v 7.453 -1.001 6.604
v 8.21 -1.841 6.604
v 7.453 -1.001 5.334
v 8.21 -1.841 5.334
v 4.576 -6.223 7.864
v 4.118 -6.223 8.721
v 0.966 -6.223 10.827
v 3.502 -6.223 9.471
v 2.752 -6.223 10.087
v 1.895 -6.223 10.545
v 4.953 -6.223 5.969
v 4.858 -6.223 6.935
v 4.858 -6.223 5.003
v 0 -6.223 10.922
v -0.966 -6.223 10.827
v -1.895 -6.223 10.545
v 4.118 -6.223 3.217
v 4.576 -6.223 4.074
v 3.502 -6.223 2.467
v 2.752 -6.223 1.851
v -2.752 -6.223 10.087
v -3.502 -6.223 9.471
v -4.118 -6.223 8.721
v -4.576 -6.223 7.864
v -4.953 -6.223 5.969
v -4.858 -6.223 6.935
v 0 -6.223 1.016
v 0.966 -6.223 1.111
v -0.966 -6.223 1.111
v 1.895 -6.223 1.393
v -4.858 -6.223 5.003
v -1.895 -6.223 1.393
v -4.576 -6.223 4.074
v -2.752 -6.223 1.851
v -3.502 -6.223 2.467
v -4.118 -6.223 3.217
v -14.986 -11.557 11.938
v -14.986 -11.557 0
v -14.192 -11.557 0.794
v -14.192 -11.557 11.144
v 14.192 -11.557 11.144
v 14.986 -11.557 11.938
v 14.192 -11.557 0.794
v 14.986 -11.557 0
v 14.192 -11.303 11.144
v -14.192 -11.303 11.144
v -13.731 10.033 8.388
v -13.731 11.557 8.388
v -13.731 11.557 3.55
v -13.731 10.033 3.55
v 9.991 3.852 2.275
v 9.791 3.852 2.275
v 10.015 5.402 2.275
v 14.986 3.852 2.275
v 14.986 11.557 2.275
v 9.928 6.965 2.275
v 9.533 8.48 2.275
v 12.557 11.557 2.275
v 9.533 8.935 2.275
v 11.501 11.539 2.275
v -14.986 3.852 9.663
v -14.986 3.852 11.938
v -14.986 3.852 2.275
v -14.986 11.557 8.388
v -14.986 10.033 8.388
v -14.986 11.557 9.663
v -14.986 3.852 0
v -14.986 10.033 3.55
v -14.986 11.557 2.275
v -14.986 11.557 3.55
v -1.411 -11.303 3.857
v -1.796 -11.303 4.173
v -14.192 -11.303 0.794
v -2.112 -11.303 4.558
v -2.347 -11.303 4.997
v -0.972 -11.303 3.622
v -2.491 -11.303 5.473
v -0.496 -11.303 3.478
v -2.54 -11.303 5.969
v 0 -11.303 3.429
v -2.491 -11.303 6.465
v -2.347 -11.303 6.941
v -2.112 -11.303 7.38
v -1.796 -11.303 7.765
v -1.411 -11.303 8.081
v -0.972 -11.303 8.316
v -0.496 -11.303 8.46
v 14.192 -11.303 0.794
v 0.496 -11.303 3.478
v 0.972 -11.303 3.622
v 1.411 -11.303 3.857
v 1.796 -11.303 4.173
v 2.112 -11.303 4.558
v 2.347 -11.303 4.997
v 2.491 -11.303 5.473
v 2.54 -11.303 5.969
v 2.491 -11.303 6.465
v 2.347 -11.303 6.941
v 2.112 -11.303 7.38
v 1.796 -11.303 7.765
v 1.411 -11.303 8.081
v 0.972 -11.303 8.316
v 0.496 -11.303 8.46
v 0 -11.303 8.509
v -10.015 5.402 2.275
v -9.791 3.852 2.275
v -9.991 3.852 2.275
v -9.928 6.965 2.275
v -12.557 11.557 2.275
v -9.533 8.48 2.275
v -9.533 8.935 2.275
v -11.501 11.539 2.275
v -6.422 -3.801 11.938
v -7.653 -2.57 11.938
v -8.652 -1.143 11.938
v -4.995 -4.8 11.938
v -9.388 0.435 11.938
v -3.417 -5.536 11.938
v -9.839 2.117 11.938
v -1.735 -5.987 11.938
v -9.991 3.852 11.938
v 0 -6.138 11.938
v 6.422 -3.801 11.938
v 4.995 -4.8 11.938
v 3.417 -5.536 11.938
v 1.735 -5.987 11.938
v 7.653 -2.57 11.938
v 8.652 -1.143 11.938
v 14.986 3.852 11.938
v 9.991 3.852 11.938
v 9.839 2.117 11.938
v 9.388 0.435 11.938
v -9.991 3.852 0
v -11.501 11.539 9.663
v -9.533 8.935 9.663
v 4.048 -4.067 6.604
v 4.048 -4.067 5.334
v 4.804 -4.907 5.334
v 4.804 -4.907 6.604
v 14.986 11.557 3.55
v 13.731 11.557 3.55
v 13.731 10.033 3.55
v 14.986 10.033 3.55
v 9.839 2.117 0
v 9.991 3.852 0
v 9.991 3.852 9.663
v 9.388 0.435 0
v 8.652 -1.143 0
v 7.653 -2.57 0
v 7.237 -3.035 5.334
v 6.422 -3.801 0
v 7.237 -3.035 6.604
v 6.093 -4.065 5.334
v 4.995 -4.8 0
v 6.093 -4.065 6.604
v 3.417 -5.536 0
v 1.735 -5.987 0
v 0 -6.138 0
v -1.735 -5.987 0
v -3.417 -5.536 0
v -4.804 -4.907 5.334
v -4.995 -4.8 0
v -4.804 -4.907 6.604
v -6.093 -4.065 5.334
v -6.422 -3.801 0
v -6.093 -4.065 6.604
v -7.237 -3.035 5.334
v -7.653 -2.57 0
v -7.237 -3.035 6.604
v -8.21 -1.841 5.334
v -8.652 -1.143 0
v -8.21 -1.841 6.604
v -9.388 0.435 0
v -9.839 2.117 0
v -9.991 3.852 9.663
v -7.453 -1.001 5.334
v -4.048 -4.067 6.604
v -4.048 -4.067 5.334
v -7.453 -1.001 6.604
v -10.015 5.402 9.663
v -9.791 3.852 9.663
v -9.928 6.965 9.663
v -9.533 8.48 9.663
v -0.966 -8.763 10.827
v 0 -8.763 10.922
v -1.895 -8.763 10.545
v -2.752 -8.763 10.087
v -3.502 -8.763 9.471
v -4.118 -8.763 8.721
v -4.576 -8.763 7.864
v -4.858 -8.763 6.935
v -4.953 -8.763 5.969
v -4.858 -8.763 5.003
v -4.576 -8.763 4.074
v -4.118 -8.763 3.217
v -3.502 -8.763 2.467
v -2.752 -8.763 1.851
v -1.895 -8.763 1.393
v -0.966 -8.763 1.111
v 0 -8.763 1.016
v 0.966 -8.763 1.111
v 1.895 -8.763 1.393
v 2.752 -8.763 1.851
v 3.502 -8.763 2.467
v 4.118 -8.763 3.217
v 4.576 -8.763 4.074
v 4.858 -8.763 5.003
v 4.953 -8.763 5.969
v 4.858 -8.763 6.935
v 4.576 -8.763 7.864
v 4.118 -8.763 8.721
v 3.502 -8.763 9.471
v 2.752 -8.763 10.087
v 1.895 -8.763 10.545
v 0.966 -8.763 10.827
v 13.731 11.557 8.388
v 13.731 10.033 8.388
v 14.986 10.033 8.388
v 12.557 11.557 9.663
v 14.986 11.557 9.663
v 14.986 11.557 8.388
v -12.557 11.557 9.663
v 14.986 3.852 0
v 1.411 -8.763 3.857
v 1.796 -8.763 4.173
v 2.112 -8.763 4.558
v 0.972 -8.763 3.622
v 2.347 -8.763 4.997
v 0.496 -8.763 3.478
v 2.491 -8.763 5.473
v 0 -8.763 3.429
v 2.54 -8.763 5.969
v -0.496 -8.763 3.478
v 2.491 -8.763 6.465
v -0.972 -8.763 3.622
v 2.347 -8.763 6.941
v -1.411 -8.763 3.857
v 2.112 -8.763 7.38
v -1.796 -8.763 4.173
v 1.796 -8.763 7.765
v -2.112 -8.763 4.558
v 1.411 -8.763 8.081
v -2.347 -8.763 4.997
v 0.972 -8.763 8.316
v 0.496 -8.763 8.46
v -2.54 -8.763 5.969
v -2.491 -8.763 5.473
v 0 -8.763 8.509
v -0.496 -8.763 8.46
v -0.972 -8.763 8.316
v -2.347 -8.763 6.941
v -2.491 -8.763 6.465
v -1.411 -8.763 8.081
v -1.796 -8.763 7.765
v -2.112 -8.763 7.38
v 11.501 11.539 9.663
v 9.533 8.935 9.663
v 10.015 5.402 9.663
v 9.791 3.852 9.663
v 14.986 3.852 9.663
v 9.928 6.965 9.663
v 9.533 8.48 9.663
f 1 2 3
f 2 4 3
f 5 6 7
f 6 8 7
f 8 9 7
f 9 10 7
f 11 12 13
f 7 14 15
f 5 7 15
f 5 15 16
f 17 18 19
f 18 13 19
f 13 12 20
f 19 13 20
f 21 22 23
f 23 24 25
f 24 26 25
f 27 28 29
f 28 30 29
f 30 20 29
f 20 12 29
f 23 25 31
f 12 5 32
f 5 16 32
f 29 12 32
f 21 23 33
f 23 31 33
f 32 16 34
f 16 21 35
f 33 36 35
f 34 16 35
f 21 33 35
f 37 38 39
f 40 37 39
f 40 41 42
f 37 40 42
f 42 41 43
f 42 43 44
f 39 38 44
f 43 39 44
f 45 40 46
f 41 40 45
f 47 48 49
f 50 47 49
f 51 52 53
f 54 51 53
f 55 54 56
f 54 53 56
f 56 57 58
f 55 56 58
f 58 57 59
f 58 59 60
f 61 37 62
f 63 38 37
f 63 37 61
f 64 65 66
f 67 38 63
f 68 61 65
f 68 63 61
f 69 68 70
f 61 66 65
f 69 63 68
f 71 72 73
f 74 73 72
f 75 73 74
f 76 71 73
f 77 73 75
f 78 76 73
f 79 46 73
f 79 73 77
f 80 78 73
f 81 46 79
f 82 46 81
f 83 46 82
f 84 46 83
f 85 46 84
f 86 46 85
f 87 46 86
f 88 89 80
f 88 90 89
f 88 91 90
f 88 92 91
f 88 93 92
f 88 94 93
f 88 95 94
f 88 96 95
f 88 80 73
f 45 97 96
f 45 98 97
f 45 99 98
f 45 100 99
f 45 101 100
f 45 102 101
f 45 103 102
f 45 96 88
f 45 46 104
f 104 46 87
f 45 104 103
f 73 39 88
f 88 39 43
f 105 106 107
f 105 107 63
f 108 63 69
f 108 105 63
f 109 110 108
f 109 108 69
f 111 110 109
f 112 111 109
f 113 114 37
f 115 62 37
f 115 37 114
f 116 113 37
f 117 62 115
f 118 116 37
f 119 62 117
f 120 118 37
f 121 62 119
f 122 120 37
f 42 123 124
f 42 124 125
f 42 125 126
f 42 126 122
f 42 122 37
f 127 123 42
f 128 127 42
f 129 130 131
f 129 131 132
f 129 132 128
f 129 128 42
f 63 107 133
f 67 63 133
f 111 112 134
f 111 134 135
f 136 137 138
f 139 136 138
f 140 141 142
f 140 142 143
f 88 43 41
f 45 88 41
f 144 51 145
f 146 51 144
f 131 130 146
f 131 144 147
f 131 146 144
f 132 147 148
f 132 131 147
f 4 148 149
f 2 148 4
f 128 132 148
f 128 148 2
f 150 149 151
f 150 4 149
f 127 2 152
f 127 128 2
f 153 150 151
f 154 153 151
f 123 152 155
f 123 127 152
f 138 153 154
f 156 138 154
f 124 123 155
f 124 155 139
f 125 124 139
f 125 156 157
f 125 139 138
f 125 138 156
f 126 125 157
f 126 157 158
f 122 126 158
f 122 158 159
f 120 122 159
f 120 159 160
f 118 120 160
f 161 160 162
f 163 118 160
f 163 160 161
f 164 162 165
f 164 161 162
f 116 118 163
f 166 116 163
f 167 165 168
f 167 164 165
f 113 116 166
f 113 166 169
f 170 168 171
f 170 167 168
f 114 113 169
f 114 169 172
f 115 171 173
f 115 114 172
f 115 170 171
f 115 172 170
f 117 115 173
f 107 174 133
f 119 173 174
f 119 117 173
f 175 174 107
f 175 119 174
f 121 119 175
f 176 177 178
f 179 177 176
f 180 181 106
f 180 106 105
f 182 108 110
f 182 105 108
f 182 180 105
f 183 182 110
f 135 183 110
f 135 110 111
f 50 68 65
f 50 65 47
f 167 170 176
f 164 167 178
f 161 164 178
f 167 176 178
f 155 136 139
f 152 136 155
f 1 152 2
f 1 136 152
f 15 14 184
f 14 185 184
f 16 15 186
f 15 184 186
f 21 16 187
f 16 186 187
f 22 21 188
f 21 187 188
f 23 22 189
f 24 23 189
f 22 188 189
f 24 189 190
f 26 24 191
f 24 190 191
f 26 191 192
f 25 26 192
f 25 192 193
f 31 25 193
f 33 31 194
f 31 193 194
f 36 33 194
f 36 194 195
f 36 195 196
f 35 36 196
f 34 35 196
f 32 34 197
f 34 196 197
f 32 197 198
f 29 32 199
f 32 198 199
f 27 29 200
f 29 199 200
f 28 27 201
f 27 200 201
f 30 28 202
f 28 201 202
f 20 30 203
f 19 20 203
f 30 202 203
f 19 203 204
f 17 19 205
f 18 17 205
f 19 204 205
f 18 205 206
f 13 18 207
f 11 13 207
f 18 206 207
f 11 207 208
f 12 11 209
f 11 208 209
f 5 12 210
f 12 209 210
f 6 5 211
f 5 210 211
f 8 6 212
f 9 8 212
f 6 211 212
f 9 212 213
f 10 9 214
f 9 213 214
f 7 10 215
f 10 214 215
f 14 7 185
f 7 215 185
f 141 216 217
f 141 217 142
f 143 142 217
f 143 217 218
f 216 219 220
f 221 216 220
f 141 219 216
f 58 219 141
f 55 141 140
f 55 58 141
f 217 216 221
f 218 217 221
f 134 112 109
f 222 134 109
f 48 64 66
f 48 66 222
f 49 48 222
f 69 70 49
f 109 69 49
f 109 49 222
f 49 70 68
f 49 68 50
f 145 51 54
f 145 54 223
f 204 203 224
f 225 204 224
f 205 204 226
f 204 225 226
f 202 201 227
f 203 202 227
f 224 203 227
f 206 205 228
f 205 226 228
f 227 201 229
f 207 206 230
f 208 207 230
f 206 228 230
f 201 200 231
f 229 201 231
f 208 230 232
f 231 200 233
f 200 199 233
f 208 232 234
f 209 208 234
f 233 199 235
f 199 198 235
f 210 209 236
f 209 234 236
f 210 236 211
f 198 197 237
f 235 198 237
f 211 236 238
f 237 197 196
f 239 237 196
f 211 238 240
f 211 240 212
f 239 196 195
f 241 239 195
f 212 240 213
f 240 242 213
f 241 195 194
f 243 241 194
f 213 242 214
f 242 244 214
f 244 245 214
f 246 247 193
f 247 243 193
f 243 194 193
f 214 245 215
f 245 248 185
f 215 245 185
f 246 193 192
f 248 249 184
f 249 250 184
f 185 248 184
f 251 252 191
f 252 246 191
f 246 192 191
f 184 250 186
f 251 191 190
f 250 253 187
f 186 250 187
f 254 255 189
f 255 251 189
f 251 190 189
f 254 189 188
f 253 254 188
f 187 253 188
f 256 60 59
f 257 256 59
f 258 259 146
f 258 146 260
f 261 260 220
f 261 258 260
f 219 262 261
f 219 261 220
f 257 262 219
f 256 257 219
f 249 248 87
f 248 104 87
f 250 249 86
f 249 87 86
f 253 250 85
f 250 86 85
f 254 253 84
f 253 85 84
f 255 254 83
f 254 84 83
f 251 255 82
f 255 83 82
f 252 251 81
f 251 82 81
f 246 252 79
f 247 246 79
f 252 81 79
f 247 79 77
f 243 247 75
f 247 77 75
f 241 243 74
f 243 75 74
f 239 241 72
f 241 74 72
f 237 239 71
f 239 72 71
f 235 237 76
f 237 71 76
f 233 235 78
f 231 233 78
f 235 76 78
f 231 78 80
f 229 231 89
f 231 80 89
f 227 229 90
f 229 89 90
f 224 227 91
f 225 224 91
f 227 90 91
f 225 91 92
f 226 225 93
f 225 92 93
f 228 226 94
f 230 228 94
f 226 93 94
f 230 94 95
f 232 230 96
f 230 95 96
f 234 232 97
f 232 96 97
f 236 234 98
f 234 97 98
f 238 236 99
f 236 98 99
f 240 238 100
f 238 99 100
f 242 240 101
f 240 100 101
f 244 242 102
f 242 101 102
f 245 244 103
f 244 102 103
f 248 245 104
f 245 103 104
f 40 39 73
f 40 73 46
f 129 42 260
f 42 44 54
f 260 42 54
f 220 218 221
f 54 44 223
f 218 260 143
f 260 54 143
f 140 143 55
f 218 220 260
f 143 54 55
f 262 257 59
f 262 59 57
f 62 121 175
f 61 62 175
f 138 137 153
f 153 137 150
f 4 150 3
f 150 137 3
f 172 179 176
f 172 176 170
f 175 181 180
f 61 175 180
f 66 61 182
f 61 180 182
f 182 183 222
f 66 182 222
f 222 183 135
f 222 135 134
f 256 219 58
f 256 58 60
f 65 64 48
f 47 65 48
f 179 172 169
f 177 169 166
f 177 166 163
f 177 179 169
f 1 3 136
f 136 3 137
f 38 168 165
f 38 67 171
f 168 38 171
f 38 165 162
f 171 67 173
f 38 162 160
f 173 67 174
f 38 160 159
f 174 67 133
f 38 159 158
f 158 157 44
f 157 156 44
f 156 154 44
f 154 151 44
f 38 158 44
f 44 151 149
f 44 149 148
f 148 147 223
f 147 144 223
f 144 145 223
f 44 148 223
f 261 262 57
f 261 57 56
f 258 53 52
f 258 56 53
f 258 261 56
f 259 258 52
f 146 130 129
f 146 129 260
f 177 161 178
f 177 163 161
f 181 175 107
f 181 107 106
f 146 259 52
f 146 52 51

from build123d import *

# Parameters (mm, degrees)
SKETCH1_W               = 29.972
SKETCH1_H               = 23.114
EXTRUDE1_DEPTH          = 11.938
CUT_EXTRUDE1_DEPTH      = 12.938
SKETCH3_W               = 2.27457
SKETCH3_H               = 7.704666667
CUT_EXTRUDE2_DEPTH      = 15.986
CUT_EXTRUDE2_DEPTH_BACK = 15.986
SKETCH4_W               = 28.3845
SKETCH4_H               = 10.3505
CUT_EXTRUDE3_DEPTH      = 0.254
SKETCH5_W               = 1.255132872
SKETCH5_H               = 4.83743
CUT_EXTRUDE4_DEPTH      = 1.524
EXTRUDE2_DEPTH          = 0.635
CUT_EXTRUDE5_DEPTH      = 12.938


with BuildPart() as part:
    # Sketch1 → Extrude1 (new body)
    with BuildSketch(Plane.XY):
        Rectangle(SKETCH1_W, SKETCH1_H)
    extrude(amount=EXTRUDE1_DEPTH)

    # Sketch2 → Cut-Extrude1 (cut, through all)
    with BuildSketch(Plane.XY.offset(11.938)):
        with BuildLine():
            Line((-9.990666667, 3.852333333), (-9.790853333, 3.852333333))
            ThreePointArc((-9.790853333, 3.852333333), (-10.010454448, 6.185541418), (-9.5329375, 8.479895833))
            Line((-9.5329375, 8.479895833), (-9.5329375, 11.504083333))
            Line((-9.5329375, 11.504083333), (-12.557125, 11.557))
            Line((-12.557125, 11.557), (12.557125, 11.557))
            Line((12.557125, 11.557), (9.5329375, 11.504083333))
            Line((9.5329375, 11.504083333), (9.5329375, 8.479895833))
            ThreePointArc((9.5329375, 8.479895833), (10.010454448, 6.185541418), (9.790853333, 3.852333333))
            Line((9.790853333, 3.852333333), (9.990666667, 3.852333333))
            ThreePointArc((9.990666667, 3.852333333), (0, -6.138333333), (-9.990666667, 3.852333333))
        make_face()
    extrude(amount=-CUT_EXTRUDE1_DEPTH, mode=Mode.SUBTRACT)

    # Sketch3 → Cut-Extrude2 (cut, two sides)
    with BuildSketch(Plane(origin=(0, 0, 0), x_dir=(0, 0, -1), z_dir=(1, 0, 0))) as cut_extrude2_sk:
        with Locations((-10.800715, 7.704666667)):
            Rectangle(SKETCH3_W, SKETCH3_H)
        with Locations((-1.137285, 7.704666667)):
            Rectangle(SKETCH3_W, SKETCH3_H)
    extrude(amount=CUT_EXTRUDE2_DEPTH, mode=Mode.SUBTRACT)
    extrude(cut_extrude2_sk.sketch, amount=-CUT_EXTRUDE2_DEPTH_BACK, mode=Mode.SUBTRACT)

    # Sketch4 → Cut-Extrude3 (cut)
    with BuildSketch(Plane.XZ.offset(11.557)):
        with Locations((0, 5.969)):
            Rectangle(SKETCH4_W, SKETCH4_H)
    extrude(amount=-CUT_EXTRUDE3_DEPTH, mode=Mode.SUBTRACT)

    # Sketch5 → Cut-Extrude4 (cut)
    with BuildSketch(Plane(origin=(0, 11.557, 0), x_dir=(1, 0, 0), z_dir=(0, 1, 0))):
        with Locations((-14.358433564, -5.969)):
            Rectangle(SKETCH5_W, SKETCH5_H)
        with Locations((14.358433564, -5.969)):
            Rectangle(SKETCH5_W, SKETCH5_H)
    extrude(amount=-CUT_EXTRUDE4_DEPTH, mode=Mode.SUBTRACT)

    # Sketch6 → Cut-Revolve1 (revolve, cut)
    with BuildSketch(Plane(origin=(0, 0, 5.969), x_dir=(-1, 0, 0), z_dir=(0, 0, -1)), mode=Mode.PRIVATE) as cut_revolve1_sk:
        Polygon((2.54, -11.303), (0, -11.303), (0, -6.223), (4.953, -6.223), (4.953, -8.763), (2.54, -8.763), align=None)
    revolve(cut_revolve1_sk.sketch.rotate(Axis((0, 0, 5.969), (0, -1, 0)), 270), axis=Axis((0, 0, 5.969), (0, -1, 0)), mode=Mode.SUBTRACT)  # turned: the seam where the file's is

    # Sketch7 → Extrude2 (add, symmetric)
    with BuildSketch(Plane(origin=(0, 0, 5.969), x_dir=(-1, 0, 0), z_dir=(0, 0, -1))):
        with BuildLine():
            Line((4.047558738, -4.067217721), (7.45308183, -1.000870956))
            Line((7.45308183, -1.000870956), (8.209636208, -1.841109717))
            ThreePointArc((8.209636208, -1.841109717), (6.685060845, -3.572178903), (4.804113117, -4.907456482))
            Line((4.804113117, -4.907456482), (4.047558738, -4.067217721))
        make_face()
        with BuildLine():
            Line((-4.047558738, -4.067217721), (-4.804113117, -4.907456482))
            ThreePointArc((-4.804113117, -4.907456482), (-6.685060845, -3.572178903), (-8.209636208, -1.841109717))
            Line((-8.209636208, -1.841109717), (-7.45308183, -1.000870956))
            Line((-7.45308183, -1.000870956), (-4.047558738, -4.067217721))
        make_face()
    extrude(amount=EXTRUDE2_DEPTH, both=True)

    # Sketch8 → Cut-Extrude5 (cut, through all)
    with BuildSketch(Plane.XY):
        Polygon((-9.5329375, 11.538527778), (-11.5014375, 11.538527778), (-9.5329375, 8.935027778), align=None)
        Polygon((9.5329375, 11.538527778), (11.5014375, 11.538527778), (9.5329375, 8.935027778), align=None)
    extrude(amount=CUT_EXTRUDE5_DEPTH, mode=Mode.SUBTRACT)


solid = part.part
